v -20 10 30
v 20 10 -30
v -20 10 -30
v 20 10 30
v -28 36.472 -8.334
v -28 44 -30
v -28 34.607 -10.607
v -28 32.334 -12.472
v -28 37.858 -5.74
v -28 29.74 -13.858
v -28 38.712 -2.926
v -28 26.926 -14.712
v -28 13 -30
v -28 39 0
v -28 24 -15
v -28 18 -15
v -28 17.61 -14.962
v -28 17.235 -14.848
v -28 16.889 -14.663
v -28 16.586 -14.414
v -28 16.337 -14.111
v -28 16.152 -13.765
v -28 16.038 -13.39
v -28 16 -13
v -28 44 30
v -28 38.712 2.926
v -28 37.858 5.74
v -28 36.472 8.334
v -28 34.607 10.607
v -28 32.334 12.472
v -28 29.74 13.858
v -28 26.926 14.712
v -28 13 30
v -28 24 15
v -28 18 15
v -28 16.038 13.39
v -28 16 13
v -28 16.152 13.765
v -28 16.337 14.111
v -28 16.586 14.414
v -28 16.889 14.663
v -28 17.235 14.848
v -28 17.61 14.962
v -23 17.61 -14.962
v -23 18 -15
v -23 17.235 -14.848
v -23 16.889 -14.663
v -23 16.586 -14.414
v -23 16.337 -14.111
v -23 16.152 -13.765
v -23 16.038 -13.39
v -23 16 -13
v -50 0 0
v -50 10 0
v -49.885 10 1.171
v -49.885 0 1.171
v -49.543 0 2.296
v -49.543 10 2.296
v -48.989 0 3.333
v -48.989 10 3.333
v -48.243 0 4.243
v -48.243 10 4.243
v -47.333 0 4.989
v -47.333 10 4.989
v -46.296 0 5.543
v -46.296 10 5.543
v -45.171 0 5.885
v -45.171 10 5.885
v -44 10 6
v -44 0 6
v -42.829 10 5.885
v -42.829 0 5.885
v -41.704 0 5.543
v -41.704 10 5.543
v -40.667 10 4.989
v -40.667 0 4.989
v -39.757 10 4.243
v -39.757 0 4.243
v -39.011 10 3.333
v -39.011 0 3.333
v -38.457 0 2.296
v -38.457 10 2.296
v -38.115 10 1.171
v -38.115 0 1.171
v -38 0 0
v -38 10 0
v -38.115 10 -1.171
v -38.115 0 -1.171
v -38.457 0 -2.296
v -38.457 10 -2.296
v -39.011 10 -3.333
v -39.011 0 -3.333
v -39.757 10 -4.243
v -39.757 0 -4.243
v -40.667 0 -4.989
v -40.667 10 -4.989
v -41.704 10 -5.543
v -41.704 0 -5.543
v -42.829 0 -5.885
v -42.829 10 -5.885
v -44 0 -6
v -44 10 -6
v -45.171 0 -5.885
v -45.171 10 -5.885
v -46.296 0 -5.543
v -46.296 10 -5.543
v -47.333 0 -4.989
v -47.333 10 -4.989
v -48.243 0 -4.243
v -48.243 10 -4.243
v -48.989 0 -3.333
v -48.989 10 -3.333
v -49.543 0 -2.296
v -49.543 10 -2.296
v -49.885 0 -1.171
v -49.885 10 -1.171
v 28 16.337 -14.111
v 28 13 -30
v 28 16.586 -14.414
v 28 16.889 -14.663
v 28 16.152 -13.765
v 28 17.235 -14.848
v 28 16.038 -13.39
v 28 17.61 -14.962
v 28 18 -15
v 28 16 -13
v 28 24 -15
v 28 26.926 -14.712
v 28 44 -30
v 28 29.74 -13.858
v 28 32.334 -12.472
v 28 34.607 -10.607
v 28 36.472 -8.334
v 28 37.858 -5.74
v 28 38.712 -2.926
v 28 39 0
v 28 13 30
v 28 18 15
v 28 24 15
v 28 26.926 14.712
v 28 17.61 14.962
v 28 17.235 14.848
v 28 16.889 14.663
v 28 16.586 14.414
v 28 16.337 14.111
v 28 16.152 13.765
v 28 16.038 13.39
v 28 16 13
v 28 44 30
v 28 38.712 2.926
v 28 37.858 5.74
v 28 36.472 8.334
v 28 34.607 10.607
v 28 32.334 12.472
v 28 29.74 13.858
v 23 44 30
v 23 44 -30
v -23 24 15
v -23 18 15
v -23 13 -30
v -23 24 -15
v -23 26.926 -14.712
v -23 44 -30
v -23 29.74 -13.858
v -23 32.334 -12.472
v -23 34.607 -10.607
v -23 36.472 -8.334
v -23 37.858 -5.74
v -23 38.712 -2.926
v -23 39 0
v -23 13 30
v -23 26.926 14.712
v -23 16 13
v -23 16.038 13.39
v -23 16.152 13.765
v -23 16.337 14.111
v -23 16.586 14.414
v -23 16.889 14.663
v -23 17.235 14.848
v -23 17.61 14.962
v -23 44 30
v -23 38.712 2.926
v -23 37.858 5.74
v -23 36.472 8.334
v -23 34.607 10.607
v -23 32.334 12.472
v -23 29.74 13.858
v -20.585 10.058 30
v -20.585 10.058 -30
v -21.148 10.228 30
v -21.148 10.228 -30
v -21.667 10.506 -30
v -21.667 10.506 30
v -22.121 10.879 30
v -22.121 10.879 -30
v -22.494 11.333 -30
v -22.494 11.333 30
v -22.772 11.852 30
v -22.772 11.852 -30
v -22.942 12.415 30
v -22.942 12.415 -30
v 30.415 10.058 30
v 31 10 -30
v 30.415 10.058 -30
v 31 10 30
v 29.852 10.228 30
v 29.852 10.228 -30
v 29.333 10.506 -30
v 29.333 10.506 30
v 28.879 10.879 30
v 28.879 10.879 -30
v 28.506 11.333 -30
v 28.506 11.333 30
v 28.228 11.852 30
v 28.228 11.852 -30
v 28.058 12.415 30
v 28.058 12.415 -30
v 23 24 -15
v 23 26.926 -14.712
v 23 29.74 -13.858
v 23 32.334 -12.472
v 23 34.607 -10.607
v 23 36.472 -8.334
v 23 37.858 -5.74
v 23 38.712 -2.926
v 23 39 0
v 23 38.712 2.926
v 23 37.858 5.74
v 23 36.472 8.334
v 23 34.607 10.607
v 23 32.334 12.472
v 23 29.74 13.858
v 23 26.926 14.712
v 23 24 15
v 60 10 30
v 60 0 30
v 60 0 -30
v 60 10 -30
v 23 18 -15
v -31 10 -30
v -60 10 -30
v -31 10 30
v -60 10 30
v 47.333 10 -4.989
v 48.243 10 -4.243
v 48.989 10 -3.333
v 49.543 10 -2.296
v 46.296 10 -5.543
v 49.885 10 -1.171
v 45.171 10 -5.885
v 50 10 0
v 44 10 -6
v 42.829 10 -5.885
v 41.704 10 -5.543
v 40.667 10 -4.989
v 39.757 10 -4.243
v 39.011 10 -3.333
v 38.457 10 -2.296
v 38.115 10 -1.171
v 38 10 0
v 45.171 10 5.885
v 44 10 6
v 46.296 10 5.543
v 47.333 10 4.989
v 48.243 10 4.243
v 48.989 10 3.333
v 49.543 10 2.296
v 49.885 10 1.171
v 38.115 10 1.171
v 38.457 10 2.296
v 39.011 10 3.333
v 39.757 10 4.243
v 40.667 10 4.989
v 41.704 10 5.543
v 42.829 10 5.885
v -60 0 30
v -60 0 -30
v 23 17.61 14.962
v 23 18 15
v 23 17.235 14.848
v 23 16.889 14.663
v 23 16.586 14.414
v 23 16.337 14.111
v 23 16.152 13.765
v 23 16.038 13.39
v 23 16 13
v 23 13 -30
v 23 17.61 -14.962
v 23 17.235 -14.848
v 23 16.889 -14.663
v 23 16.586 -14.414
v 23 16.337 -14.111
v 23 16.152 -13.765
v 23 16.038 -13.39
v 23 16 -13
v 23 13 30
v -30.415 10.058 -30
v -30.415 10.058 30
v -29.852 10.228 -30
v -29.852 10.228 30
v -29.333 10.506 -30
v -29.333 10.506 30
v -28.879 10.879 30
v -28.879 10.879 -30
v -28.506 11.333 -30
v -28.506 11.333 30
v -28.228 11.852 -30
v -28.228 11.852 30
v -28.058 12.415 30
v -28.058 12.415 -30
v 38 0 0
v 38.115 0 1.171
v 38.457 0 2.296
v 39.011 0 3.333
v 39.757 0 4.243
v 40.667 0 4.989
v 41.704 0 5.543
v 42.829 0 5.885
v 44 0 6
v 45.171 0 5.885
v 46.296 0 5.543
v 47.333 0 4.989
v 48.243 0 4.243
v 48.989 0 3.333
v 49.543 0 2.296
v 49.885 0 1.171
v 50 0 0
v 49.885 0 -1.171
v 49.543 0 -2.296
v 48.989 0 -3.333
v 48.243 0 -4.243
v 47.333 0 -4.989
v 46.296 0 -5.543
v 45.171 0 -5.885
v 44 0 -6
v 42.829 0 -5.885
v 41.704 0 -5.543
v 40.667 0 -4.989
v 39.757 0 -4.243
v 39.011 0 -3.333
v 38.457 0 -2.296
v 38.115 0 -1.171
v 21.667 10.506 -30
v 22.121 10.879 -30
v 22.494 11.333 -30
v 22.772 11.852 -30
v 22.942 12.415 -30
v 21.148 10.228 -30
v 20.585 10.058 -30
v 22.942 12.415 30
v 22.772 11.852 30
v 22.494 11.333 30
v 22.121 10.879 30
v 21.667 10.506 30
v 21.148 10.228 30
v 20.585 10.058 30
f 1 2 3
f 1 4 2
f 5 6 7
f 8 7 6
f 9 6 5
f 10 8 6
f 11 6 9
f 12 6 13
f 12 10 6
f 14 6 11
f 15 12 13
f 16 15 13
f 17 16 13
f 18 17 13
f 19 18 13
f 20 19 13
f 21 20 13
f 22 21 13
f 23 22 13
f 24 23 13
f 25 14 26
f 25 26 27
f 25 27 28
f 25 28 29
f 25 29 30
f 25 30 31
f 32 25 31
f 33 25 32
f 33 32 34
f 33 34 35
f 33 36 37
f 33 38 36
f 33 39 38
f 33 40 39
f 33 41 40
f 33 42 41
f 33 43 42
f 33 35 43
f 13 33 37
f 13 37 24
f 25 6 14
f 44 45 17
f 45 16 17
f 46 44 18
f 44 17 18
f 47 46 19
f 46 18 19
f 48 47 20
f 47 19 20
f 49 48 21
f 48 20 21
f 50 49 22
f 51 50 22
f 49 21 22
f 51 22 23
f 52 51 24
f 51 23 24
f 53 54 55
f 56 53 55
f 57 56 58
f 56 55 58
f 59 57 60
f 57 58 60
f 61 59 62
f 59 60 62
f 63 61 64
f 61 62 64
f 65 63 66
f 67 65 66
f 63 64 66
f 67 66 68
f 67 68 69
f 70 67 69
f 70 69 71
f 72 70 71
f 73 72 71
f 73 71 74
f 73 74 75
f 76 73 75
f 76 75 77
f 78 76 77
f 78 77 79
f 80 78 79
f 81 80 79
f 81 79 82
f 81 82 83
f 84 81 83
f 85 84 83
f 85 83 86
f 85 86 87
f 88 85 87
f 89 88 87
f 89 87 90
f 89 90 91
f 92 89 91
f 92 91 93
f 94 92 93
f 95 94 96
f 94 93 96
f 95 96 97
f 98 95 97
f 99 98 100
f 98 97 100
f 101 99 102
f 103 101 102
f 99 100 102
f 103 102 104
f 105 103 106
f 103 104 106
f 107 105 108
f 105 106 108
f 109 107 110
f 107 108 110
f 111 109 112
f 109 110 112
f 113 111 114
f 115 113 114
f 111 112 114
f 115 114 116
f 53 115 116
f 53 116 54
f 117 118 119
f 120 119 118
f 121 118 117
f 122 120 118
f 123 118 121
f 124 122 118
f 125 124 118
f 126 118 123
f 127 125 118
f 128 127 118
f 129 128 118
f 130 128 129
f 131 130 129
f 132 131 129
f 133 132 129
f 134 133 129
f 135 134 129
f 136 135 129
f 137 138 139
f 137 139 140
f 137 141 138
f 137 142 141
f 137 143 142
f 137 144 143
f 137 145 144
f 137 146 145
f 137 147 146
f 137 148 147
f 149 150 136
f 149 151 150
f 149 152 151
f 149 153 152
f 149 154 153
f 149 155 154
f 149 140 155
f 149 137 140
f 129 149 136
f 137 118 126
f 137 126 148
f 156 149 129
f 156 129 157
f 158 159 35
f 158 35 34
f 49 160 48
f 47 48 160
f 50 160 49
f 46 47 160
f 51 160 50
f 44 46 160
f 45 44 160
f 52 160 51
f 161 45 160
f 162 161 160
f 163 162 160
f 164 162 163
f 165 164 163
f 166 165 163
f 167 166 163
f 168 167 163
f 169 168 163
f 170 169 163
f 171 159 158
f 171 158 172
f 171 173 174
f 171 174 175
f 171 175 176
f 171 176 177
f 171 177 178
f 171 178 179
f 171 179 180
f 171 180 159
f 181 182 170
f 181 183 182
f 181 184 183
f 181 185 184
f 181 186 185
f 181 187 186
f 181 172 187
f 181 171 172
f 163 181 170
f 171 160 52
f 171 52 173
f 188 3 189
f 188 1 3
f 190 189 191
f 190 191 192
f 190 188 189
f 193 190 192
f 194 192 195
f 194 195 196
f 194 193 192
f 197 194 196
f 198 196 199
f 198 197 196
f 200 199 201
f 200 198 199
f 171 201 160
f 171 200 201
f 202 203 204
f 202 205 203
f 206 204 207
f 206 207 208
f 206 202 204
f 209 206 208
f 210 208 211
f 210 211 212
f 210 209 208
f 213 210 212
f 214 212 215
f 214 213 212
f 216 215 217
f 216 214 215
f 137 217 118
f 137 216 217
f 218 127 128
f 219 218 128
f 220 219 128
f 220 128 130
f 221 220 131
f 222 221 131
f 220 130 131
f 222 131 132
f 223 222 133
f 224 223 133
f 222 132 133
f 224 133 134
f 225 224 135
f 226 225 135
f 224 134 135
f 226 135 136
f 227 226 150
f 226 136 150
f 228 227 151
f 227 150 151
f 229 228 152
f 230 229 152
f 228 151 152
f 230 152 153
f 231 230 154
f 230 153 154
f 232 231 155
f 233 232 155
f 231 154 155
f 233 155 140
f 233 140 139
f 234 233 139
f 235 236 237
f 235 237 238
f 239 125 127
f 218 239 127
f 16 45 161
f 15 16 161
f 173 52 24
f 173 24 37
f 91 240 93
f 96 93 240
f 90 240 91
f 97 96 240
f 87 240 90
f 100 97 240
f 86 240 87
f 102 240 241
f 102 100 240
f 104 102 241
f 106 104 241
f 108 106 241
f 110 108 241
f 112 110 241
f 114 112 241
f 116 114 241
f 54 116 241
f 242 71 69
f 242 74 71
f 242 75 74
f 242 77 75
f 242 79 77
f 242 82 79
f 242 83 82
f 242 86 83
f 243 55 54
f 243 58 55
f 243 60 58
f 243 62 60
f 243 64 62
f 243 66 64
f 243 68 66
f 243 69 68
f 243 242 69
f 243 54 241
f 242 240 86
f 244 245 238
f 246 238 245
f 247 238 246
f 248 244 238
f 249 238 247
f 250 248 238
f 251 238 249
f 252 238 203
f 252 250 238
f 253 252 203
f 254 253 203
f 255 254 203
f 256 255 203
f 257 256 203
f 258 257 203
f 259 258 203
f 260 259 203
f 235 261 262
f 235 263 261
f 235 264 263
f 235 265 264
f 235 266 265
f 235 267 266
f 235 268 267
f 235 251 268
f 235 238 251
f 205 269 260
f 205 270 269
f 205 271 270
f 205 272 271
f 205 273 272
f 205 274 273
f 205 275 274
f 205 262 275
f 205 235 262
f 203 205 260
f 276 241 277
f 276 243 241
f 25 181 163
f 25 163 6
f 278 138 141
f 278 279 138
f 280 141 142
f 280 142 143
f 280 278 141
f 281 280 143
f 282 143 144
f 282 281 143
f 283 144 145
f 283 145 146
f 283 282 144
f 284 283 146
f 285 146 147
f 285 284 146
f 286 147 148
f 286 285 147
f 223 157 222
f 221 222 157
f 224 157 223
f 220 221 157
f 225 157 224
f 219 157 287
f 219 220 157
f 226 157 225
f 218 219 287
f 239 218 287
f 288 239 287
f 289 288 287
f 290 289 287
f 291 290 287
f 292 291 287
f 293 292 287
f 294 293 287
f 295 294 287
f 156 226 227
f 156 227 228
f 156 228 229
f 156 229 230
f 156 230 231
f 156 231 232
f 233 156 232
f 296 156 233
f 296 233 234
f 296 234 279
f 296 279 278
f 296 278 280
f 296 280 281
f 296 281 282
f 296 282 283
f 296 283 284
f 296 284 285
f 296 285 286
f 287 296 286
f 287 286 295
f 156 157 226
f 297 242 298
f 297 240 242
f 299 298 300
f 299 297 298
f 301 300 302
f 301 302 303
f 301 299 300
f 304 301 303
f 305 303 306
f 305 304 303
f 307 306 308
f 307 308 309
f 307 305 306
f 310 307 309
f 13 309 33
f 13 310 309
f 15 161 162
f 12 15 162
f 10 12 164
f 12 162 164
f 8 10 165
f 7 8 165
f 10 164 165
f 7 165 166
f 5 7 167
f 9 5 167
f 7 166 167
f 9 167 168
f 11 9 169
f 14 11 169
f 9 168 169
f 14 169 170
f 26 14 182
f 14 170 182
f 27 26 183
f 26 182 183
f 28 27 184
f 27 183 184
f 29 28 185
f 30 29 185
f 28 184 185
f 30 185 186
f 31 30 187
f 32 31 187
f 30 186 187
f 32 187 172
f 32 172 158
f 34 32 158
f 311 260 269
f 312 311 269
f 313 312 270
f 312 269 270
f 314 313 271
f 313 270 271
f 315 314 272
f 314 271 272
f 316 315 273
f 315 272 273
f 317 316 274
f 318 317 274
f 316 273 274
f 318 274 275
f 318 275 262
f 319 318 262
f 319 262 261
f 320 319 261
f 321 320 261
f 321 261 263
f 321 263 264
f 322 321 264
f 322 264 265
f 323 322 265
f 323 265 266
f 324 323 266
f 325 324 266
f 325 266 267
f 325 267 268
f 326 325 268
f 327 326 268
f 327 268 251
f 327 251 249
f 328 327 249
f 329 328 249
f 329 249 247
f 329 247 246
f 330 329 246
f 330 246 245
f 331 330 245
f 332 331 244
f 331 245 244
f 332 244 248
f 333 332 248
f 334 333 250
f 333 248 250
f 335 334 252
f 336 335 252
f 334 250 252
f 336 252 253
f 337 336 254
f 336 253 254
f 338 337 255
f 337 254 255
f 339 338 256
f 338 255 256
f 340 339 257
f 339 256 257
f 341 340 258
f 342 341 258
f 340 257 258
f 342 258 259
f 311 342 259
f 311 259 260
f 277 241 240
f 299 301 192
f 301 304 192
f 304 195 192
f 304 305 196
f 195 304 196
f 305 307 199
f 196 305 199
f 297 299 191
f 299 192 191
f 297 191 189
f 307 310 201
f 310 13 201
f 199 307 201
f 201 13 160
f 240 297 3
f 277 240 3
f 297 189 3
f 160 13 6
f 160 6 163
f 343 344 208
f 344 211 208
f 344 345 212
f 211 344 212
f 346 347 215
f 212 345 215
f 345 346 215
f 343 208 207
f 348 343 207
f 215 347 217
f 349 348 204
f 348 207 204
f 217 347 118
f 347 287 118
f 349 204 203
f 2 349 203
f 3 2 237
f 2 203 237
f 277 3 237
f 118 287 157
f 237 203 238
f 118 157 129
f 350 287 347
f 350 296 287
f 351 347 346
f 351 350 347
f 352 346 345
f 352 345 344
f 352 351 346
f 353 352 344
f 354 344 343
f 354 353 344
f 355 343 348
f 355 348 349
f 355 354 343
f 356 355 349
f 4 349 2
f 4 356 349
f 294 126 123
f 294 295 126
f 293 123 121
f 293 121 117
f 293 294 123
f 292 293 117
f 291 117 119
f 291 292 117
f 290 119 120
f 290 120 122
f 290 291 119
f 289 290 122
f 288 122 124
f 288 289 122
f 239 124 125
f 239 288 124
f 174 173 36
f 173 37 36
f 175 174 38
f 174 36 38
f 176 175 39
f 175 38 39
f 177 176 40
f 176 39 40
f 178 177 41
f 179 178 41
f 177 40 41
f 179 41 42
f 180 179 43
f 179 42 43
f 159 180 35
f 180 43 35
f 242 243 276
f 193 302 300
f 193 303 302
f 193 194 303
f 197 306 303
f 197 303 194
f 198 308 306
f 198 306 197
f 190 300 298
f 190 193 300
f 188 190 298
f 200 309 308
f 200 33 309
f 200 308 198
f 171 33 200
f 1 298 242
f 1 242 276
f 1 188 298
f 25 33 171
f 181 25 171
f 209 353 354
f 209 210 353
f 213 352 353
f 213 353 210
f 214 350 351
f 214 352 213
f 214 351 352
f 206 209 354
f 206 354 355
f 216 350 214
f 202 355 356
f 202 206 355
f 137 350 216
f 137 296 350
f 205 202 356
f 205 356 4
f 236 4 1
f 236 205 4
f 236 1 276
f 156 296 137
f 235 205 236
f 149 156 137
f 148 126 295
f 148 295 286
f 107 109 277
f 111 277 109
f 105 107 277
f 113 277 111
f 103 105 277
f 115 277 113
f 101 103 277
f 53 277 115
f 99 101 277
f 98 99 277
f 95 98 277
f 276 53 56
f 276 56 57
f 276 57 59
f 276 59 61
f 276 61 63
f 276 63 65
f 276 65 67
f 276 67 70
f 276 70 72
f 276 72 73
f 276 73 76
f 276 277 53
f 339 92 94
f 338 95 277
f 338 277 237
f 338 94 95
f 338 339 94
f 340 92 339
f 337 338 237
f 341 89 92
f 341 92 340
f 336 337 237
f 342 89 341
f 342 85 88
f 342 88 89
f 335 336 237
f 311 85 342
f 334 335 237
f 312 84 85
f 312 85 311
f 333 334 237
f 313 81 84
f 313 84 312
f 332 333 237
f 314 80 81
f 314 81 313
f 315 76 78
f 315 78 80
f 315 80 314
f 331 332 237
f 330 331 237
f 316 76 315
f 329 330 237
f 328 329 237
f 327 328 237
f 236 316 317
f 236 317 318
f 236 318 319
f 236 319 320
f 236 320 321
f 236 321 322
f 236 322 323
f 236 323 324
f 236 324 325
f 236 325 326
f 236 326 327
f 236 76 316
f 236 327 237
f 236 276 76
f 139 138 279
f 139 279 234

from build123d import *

# Parameters (mm, degrees)
F1_DEPTH      = 30
F1_DEPTH_BACK = 30
F2_R          = 6
F3_DEPTH      = 10.001
F4_R          = 3
F5_W          = 8
F5_H          = 30
F6_DEPTH      = 100
F7_R          = 2


with BuildPart() as f1:
    # F0 (on Top) → F1 (new body, two sides)
    with BuildSketch(Plane.XY) as f1_sk:
        Polygon((-60, 10), (-60, 0), (60, 0), (60, 10), (28, 10), (28, 44), (23, 44), (23, 10), (-23, 10), (-23, 44), (-28, 44), (-28, 10), align=None)
    extrude(amount=F1_DEPTH)
    extrude(f1_sk.sketch, amount=-F1_DEPTH_BACK)

    # F2 (on face) → F3 (cut, through all)
    with BuildSketch(Plane(origin=(0, 10, 0), x_dir=(-1, 0, 0), z_dir=(0, 1, 0))):
        with Locations((44, 0)):
            Circle(F2_R)
        with Locations((-44, 0)):
            Circle(F2_R)
    extrude(amount=-F3_DEPTH, mode=Mode.SUBTRACT)

    # F4
    f4_edges = [f1.edges().sort_by_distance(p)[0] for p in [
        (28, 10, 0),
        (23, 10, 0),
        (-28, 10, 0),
        (-23, 10, 0),
    ]]
    fillet(f4_edges, radius=F4_R)

    # F5 (on face) → F6 (cut)
    with BuildSketch(Plane.YZ.offset(28)):
        with BuildLine():
            ThreePointArc((24, -15), (39, 0), (24, 15))
            Line((24, 15), (24, -15))
        make_face()
        with Locations((20, 0)):
            Rectangle(F5_W, F5_H)
    extrude(amount=-F6_DEPTH, mode=Mode.SUBTRACT)

    # F7
    f7_edges = [f1.edges().sort_by_distance(p)[0] for p in [
        (25.5, 16, -15),
        (-25.5, 16, -15),
        (25.5, 16, 15),
        (-25.5, 16, 15),
    ]]
    fillet(f7_edges, radius=F7_R)


solid = f1.part
